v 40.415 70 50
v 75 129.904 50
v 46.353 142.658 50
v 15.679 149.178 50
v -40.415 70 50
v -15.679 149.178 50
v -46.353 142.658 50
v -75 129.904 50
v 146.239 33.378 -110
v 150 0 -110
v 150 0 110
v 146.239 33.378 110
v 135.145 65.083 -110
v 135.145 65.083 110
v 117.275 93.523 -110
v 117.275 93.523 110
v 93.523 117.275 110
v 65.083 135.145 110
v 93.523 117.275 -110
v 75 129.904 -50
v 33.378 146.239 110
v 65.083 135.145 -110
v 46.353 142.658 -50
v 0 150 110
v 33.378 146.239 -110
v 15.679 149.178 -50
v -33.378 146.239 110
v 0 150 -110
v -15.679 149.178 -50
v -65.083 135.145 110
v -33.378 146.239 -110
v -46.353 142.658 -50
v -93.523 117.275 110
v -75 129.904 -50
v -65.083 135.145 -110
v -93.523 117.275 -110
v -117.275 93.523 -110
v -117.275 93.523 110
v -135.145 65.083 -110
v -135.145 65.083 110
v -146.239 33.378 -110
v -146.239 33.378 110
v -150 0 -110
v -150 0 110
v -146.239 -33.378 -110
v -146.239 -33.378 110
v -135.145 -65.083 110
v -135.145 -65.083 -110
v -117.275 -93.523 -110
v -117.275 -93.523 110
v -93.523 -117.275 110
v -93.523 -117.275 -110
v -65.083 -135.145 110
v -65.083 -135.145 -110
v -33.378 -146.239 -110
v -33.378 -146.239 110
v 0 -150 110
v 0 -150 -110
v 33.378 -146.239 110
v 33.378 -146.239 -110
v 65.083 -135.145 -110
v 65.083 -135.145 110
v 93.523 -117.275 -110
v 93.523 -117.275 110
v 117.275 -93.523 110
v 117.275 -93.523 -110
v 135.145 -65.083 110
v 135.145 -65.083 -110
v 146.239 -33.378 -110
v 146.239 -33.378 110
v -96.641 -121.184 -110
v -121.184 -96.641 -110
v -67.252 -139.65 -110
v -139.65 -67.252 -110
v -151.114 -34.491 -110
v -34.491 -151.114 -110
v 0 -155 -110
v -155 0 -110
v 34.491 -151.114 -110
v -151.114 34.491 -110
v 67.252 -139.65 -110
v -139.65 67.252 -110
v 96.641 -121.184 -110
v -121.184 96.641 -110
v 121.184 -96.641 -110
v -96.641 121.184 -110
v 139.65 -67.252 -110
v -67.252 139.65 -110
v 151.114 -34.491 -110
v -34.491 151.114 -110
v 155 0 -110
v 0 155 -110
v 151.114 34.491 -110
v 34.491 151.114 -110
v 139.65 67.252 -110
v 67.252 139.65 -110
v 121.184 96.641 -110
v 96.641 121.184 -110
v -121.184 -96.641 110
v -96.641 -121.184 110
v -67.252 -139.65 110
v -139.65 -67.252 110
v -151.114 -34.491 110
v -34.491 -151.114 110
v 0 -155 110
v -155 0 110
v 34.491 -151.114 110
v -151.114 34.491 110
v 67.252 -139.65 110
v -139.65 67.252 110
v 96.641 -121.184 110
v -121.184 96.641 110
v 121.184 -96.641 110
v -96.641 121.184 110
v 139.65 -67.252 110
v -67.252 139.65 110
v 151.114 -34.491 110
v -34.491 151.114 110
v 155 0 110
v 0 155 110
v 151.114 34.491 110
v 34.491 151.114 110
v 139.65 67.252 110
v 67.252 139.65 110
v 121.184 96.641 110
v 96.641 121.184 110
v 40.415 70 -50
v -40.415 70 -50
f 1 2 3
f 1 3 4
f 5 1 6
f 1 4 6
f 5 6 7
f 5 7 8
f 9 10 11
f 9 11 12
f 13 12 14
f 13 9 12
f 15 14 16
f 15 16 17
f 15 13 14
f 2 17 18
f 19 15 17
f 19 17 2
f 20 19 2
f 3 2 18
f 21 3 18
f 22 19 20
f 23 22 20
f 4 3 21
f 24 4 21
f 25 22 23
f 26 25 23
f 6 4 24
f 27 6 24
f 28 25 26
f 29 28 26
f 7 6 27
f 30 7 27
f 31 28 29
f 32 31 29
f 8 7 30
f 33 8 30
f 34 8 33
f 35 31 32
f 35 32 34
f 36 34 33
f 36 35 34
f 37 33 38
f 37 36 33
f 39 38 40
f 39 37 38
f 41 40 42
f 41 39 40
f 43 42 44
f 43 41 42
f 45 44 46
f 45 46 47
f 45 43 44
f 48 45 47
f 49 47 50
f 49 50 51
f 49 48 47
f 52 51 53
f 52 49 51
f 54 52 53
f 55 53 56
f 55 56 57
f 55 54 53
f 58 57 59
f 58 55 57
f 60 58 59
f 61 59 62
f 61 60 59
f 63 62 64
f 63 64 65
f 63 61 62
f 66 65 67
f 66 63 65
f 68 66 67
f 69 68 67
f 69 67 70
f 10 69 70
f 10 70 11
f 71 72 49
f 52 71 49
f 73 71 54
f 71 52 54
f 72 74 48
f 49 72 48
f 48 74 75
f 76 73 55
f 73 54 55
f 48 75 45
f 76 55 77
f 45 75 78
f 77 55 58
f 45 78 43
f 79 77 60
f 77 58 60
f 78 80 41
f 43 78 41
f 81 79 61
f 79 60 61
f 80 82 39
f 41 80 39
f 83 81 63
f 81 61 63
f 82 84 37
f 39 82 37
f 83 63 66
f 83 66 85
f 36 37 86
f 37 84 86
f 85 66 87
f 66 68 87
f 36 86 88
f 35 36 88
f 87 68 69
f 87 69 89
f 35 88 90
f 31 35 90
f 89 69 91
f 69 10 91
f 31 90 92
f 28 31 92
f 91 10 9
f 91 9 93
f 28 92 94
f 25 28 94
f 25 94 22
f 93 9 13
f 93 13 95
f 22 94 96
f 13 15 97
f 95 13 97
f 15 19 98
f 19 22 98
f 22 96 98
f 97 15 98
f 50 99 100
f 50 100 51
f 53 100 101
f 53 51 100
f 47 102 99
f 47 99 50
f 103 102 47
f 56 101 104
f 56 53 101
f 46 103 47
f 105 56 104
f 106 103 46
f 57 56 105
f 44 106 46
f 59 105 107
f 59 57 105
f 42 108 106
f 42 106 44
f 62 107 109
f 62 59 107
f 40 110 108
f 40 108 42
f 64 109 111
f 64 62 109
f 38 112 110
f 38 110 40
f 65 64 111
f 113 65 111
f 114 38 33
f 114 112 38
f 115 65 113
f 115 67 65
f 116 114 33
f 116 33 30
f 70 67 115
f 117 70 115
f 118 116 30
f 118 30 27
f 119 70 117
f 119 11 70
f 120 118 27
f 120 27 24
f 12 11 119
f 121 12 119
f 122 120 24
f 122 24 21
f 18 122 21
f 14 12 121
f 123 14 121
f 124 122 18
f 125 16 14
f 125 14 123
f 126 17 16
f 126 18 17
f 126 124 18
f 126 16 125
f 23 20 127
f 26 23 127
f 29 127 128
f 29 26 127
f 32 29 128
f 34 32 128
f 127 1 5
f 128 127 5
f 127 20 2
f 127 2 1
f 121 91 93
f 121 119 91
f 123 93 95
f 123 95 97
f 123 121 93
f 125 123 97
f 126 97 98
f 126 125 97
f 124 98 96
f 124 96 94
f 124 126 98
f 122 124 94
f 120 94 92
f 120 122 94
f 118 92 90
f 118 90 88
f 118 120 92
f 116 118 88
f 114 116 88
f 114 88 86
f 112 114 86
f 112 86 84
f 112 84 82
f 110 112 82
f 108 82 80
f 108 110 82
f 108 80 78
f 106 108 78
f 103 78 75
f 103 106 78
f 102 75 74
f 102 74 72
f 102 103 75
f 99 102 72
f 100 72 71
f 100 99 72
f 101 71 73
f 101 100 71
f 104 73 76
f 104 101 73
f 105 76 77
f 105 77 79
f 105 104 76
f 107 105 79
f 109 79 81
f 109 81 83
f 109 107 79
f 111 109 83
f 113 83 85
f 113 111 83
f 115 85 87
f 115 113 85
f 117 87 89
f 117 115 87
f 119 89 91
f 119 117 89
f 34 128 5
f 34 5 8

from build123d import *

# Parameters (mm, degrees)
SKETCH_1_R      = 155
SKETCH_1_R_2    = 150
EXTRUDE_1_DEPTH = 110
EXTRUDE_2_DEPTH = 50


with BuildPart() as part:
    # 草图1 → 凸台-拉伸1 (new body, symmetric)
    with BuildSketch(Plane.XY):
        Circle(SKETCH_1_R)
        Circle(SKETCH_1_R_2, mode=Mode.SUBTRACT)
    extrude(amount=EXTRUDE_1_DEPTH, both=True)

    # 草图2 → 凸台-拉伸2 (add, symmetric)
    with BuildSketch(Plane.XY):
        with BuildLine():
            Line((-40.414518843, 70), (-75, 129.903810568))
            ThreePointArc((-75, 129.903810568), (0, 150), (75, 129.903810568))
            Line((75, 129.903810568), (40.414518843, 70))
            Line((40.414518843, 70), (-40.414518843, 70))
        make_face()
    extrude(amount=EXTRUDE_2_DEPTH, both=True)


solid = part.part
